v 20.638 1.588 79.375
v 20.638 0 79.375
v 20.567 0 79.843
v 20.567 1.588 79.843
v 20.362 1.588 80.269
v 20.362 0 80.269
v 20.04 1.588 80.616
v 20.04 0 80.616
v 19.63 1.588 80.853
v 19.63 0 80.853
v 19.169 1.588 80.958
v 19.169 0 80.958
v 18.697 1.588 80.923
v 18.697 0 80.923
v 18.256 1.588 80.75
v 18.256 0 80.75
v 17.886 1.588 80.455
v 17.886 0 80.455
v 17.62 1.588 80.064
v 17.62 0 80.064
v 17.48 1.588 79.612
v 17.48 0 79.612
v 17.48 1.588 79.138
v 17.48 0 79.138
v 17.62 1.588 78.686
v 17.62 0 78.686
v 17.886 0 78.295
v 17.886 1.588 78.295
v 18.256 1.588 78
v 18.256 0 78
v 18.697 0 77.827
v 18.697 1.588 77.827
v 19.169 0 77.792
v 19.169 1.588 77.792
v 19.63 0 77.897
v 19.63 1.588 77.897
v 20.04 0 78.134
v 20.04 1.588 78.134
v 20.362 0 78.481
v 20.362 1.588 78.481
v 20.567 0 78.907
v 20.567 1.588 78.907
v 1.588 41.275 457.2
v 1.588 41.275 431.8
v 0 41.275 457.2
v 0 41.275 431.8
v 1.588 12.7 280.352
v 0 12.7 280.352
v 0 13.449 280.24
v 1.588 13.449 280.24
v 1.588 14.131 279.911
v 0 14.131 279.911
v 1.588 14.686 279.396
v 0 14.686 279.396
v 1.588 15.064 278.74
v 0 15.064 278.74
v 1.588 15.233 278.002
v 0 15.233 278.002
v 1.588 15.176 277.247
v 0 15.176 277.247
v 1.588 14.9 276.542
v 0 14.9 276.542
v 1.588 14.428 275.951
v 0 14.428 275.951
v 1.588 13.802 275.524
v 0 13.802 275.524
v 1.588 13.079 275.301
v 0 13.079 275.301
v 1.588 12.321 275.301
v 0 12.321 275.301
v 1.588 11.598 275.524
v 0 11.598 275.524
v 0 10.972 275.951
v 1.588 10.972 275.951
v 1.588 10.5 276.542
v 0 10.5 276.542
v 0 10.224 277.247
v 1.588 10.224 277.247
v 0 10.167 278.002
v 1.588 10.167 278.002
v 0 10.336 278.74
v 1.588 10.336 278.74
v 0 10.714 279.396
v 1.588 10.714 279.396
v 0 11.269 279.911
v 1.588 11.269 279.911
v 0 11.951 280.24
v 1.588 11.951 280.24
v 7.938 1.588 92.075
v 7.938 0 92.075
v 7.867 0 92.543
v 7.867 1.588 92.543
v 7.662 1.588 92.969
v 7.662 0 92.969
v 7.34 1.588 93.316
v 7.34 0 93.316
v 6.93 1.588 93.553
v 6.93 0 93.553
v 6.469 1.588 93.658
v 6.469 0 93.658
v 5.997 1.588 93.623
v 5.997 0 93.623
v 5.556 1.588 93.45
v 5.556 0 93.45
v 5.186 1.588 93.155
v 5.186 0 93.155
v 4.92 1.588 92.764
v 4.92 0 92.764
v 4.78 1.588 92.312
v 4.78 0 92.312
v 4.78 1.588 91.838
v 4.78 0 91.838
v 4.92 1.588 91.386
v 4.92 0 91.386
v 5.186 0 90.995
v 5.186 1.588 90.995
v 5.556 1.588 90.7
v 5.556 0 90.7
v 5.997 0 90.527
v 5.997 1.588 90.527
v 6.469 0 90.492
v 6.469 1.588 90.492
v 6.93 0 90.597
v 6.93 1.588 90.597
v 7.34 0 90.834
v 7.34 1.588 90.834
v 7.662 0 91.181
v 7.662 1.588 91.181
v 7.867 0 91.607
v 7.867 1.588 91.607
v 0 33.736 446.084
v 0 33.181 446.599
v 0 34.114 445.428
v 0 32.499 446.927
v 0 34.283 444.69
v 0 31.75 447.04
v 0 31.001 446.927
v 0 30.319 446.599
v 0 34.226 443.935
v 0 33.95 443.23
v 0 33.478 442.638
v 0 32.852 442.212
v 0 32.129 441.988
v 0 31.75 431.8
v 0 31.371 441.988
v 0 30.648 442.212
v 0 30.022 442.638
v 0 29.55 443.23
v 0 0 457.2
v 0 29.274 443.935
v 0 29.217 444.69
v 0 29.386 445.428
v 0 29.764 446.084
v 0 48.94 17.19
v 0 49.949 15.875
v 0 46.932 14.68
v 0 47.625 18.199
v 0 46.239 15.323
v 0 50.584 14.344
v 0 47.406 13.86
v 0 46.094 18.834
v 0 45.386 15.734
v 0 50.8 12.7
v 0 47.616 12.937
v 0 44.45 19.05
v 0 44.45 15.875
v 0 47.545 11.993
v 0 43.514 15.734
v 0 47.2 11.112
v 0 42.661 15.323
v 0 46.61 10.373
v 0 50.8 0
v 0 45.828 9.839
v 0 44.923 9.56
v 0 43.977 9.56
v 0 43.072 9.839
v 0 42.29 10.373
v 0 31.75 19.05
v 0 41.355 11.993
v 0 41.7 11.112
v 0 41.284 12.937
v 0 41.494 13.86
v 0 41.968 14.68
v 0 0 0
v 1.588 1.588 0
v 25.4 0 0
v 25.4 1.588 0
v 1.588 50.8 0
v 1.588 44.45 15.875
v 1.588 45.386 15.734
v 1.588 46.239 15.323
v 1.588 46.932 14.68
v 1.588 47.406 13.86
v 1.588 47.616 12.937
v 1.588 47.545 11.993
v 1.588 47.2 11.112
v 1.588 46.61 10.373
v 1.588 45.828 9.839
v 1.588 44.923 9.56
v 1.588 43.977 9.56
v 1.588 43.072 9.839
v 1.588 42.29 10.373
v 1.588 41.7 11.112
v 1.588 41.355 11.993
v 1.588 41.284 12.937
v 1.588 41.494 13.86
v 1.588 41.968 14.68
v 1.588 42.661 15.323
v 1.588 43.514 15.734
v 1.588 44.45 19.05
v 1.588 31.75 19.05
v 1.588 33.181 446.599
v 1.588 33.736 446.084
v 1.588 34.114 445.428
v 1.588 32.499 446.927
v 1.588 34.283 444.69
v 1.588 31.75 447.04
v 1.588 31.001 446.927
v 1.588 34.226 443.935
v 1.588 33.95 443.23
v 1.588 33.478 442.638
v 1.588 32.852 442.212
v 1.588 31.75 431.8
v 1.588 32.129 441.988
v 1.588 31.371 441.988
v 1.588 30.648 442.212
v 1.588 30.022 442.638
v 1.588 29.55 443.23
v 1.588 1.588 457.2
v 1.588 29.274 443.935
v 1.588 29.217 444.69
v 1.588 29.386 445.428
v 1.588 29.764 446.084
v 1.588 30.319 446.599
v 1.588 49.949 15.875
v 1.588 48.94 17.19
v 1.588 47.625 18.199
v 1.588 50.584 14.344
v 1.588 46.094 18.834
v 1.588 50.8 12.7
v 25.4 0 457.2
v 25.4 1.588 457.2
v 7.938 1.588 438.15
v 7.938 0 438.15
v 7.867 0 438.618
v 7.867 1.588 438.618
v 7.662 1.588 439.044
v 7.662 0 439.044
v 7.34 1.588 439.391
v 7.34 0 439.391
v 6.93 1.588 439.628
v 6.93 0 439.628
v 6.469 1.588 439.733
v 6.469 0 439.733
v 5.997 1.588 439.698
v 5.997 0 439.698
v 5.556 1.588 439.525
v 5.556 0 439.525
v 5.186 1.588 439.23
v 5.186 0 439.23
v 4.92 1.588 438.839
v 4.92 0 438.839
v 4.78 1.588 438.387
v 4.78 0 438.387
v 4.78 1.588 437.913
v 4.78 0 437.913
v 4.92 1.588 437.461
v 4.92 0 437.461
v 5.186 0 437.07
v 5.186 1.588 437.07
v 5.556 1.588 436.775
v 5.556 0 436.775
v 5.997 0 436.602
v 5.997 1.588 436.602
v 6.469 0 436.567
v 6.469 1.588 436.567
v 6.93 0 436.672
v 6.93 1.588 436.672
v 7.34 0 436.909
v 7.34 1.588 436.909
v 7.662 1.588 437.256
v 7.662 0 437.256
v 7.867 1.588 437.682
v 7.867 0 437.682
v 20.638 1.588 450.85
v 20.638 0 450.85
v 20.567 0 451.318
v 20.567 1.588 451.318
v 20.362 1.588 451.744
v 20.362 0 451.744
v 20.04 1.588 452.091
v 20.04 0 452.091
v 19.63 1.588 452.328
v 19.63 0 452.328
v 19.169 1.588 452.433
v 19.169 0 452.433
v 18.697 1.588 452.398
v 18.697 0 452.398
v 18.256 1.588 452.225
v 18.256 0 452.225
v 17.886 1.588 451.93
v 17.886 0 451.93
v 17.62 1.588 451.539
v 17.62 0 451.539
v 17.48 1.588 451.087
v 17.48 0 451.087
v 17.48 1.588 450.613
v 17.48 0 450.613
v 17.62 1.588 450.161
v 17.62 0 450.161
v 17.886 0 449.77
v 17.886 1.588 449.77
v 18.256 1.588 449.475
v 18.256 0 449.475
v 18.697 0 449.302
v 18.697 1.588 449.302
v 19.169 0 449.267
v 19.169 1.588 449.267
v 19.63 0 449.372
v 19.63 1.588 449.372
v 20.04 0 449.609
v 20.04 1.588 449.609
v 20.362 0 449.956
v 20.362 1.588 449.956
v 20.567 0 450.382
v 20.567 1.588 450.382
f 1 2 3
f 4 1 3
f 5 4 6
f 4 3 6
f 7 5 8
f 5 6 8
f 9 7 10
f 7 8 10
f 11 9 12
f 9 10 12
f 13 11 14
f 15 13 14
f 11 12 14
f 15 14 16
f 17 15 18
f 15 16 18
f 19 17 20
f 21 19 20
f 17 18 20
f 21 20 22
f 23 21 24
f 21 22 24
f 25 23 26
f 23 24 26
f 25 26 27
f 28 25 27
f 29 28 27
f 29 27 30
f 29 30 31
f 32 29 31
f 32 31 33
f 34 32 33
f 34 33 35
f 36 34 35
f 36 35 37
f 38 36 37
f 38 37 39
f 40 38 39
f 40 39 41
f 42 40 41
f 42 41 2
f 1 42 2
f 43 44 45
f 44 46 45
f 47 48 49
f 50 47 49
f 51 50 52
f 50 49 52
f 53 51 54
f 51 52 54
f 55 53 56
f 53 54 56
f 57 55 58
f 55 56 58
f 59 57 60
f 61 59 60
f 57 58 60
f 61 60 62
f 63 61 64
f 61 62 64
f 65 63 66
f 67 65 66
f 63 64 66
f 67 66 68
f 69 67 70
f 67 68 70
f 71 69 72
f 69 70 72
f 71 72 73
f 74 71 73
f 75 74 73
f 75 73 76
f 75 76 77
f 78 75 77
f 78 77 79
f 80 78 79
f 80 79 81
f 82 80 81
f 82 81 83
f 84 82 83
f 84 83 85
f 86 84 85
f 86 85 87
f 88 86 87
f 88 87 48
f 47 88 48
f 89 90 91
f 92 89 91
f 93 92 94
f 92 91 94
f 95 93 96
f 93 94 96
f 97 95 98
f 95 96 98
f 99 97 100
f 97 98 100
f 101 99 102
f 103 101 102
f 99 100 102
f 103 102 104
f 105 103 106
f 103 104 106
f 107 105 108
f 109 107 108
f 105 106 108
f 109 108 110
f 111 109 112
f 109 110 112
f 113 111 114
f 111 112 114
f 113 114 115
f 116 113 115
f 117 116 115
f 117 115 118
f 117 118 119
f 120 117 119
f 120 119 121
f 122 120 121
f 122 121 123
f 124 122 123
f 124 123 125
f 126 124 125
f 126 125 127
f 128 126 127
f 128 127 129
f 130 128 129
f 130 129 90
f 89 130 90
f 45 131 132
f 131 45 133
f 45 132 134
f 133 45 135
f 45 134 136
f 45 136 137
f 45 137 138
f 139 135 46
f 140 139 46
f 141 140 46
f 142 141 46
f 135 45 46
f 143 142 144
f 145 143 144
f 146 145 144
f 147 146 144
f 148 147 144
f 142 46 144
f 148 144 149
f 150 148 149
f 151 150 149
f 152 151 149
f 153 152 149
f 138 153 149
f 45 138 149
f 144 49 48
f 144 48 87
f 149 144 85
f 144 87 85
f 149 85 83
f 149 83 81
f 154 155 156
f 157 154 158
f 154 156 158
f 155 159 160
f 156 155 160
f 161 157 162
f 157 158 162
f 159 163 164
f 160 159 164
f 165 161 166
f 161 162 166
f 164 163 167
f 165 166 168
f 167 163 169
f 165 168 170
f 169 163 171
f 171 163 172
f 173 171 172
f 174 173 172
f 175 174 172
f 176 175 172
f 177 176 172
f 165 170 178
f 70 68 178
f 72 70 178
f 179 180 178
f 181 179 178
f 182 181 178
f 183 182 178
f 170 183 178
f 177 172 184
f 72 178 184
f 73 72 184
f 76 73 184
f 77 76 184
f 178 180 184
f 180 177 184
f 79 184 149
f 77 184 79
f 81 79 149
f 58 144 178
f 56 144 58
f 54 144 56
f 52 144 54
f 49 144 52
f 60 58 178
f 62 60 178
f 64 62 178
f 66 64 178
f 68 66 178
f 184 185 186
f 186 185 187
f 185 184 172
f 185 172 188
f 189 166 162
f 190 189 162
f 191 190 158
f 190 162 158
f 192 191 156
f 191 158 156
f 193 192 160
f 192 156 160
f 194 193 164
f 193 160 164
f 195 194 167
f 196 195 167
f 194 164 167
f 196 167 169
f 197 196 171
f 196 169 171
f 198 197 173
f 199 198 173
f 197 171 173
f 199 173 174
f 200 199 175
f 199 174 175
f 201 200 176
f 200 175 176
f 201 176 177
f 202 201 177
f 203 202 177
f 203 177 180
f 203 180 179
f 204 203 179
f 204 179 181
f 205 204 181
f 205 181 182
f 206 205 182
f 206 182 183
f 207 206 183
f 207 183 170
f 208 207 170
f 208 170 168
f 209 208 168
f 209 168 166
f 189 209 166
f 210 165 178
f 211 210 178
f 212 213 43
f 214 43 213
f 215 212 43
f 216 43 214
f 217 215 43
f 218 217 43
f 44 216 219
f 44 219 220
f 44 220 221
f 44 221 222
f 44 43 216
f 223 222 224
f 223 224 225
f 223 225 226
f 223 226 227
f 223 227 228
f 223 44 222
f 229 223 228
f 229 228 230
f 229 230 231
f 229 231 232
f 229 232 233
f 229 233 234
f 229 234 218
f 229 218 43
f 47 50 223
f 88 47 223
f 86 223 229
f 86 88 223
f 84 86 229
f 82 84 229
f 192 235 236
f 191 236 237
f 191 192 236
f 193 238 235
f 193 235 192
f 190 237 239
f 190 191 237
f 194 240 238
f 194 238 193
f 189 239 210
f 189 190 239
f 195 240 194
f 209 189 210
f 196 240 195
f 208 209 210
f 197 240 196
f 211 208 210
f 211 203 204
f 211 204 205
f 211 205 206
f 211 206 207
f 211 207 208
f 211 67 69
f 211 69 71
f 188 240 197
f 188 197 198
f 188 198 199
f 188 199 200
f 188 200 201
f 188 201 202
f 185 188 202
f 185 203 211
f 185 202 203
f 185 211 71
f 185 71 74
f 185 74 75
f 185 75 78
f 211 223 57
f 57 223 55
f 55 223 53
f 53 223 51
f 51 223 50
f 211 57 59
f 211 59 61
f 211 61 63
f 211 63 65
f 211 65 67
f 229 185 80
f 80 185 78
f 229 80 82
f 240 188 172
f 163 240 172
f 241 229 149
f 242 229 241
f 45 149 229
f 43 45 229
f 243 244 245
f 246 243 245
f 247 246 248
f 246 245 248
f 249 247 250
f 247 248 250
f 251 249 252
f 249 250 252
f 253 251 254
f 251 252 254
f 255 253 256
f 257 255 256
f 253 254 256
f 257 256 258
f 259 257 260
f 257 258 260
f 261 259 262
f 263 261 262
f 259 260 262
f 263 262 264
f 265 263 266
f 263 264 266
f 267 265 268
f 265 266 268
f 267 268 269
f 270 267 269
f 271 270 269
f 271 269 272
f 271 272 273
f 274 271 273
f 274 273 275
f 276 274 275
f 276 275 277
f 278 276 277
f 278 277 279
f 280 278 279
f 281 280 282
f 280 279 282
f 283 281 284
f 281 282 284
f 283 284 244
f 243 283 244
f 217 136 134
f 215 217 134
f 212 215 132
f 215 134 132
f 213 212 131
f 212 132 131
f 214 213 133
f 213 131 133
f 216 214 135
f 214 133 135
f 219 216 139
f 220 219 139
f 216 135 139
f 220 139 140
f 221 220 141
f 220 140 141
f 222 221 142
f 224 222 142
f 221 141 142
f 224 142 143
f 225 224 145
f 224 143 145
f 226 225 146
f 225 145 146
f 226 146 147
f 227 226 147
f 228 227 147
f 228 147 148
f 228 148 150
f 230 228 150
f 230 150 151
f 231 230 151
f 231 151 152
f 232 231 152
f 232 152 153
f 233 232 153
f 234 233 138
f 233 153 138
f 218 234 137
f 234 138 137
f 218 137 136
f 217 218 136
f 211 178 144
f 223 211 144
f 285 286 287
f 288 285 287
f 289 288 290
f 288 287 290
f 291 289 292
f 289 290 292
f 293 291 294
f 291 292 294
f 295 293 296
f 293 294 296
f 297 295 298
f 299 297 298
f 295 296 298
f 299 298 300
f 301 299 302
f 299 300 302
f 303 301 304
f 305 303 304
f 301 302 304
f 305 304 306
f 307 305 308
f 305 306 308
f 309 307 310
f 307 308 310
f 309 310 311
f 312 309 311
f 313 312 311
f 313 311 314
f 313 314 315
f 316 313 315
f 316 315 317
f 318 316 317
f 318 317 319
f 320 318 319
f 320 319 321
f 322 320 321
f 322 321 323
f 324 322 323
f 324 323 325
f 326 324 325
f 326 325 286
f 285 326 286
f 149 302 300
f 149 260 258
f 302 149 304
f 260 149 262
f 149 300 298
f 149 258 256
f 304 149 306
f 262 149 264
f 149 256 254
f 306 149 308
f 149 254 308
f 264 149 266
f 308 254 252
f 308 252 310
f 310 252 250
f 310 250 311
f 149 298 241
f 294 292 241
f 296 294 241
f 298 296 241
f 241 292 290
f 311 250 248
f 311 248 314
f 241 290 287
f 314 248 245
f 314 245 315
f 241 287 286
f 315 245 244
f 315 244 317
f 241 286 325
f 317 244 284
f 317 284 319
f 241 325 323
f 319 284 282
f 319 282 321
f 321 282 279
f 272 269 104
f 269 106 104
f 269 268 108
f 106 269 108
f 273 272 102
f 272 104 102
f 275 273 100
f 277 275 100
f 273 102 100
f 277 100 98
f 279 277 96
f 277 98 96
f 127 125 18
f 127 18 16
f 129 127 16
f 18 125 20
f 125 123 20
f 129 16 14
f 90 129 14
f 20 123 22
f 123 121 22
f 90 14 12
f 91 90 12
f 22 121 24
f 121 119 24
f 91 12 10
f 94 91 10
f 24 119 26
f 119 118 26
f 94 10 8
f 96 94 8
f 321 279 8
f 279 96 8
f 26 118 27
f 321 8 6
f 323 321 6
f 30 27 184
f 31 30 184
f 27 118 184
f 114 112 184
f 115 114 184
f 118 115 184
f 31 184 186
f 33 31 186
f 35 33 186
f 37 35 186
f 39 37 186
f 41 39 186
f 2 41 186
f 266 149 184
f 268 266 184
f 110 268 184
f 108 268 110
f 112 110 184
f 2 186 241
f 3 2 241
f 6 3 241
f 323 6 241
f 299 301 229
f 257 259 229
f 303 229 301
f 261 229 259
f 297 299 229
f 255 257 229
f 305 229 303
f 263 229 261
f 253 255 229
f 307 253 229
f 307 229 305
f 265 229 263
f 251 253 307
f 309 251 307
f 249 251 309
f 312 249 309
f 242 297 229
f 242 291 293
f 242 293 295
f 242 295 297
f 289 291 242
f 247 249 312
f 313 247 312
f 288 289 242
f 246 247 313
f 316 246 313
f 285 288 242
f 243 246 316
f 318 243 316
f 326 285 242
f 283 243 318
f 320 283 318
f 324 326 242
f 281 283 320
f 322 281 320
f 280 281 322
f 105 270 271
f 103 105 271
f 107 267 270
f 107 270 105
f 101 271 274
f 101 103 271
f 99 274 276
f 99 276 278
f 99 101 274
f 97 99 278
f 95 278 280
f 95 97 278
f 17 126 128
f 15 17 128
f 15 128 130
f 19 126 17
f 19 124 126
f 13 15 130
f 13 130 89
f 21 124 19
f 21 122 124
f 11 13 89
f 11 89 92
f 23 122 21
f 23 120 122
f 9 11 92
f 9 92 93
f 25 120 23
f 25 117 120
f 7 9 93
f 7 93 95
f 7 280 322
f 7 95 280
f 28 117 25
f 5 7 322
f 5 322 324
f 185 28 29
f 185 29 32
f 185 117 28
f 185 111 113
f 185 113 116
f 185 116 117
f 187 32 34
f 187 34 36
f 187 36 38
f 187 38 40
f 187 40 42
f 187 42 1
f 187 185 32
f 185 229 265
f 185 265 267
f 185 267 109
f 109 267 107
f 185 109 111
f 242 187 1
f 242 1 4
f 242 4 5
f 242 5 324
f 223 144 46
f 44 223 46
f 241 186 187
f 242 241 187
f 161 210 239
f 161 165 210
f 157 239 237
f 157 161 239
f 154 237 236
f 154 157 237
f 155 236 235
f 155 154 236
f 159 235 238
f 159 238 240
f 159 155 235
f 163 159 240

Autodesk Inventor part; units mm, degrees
ref_plane "YZ Plane" through (0, 0, 0) normal (1, 0, 0) x (0, 1, 0)
ref_plane "XZ Plane" through (0, 0, 0) normal (0, 1, 0) x (-1, 0, 0)
ref_plane "XY Plane" through (0, 0, 0) normal (0, 0, 1) x (1, 0, 0)
sketch "Sketch1" plane through (0, 0, 0) normal (0, 0, 1) x (1, 0, 0)
  line L0 (0, 0) -> (25.4, 0)
  line L1 (25.4, 0) -> (25.4, 1.5875)
  line L2 (1.5875, 50.8) -> (0, 50.8)
  line L3 (0, 50.8) -> (0, 0)
  line L4 (1.5875, 50.8) -> (1.5875, 1.5875)
  line L5 (1.5875, 1.5875) -> (25.4, 1.5875)
  dimension "d0" = 1.5875
  dimension "d1" = 1.5875
  dimension "d2" = 25.4
  dimension "d3" = 50.8
extrude "Extrusion1" add sketch "Sketch1" along normal blind 457.2
sketch "Sketch2" plane through (0, 0, 0) normal (-1, 0, 0) x (0, 0, 1)
  line L0 (457.2, 0) -> (457.2, 50.8) projected
  line L1 (0, 50.8) -> (457.2, 50.8) projected
  line L2 (0, 50.8) -> (0, 0) projected
  line L3 (0, 0) -> (457.2, 0) projected
  line L4 (19.05, 50.8) -> (19.05, 31.75)
  line L5 (19.05, 31.75) -> (431.8, 31.75)
  circle A0 centre (12.7, 44.45) radius 3.175
  arc A1 (19.05, 44.45) -> (12.7, 50.8) centre (12.7, 44.45) ccw
  circle A2 centre (444.5, 31.75) radius 11.1125 construction
  line L6 (431.8, 31.75) -> (431.8, 41.275)
  circle A3 centre (444.5, 31.75) radius 2.54
  line L7 (431.8, 41.275) -> (457.2, 41.275)
  circle A4 centre (277.8125, 12.7) radius 11.1125 construction
  circle A5 centre (277.8125, 12.7) radius 2.54
  line L8 (266.7, 0) -> (266.7, -29.1939)
  dimension "d6" = 19.05
  dimension "d7" = 19.05
  dimension "d8" = 6.35
  dimension "d9" = 12.7
  dimension "d10" = 6.35
  dimension "d13" = 22.225
  dimension "d14" = 25.4
  dimension "d15" = 5.08
  dimension "d16" = 31.75
  dimension "d17" = 12.7
  dimension "d18" = 9.525
  dimension "d19" = 12.7
  dimension "d27" = 190.5
extrude "Extrusion2" cut sketch "Sketch2" against normal through all contours L7 L6 L5 L4 L1 L0 | L4 A1 L1 | A0 | A3 | A5
sketch "Sketch3" plane through (0, 0, 0) normal (0, -1, 0) x (1, 0, 0)
  line L0 (0, 0) -> (0, 457.2)
  line L1 (0, 0) -> (25.4, 0) projected
  line L2 (25.4, 0) -> (25.4, 457.2)
  circle A0 centre (19.05, 79.375) radius 1.5875
  circle A1 centre (6.35, 92.075) radius 1.5875
  line L3 (0, 265.1125) -> (25.4, 265.1125) construction
  circle A2 centre (19.05, 450.85) radius 1.5875
  circle A3 centre (6.35, 438.15) radius 1.5875
  line L4 (25.4, 457.2) -> (0, 457.2) projected
  line L5 (25.4, 0) -> (25.4, 457.2) projected
  line L6 (0, 0) -> (0, 457.2) projected
  dimension "d20" = 3.175
  dimension "d21" = 6.35
  dimension "d22" = 6.35
  dimension "d24" = 79.375
  dimension "d28" = 6.35
  dimension "d29" = 6.35
  dimension "d30" = 12.7
extrude "Extrusion3" cut sketch "Sketch3" against normal through all contours A0 | A1 | A2 | A3
equation "\"d0\" = d1"
properties part number "8 ball top roller L frame"
